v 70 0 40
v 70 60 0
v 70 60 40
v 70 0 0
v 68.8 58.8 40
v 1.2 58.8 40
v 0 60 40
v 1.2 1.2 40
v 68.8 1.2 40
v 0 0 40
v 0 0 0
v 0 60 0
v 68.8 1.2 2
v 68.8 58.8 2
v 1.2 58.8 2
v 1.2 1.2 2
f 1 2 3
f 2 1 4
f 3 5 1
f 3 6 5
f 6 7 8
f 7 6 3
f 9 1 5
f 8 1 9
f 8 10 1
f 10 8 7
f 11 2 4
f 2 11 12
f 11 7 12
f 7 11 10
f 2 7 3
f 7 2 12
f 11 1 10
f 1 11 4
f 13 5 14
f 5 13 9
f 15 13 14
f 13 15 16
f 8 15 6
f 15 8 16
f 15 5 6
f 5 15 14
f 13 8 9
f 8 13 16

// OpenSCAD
$fn = 32;

// ----------------------------------------------------------------------
// Open box: 1.2 mm walls
// ----------------------------------------------------------------------

// --- parameters (mm) ---
box_l = 70;               // outer length, X
box_w = 60;               // outer width, Y
box_h = 40;               // outer height, Z
wall = 1.2;               // wall thickness
floor = 2;                // floor thickness

difference() {
  cube([box_l, box_w, box_h]);
  translate([wall, wall, floor])
    cube([box_l - 2 * wall, box_w - 2 * wall, box_h]);
}
